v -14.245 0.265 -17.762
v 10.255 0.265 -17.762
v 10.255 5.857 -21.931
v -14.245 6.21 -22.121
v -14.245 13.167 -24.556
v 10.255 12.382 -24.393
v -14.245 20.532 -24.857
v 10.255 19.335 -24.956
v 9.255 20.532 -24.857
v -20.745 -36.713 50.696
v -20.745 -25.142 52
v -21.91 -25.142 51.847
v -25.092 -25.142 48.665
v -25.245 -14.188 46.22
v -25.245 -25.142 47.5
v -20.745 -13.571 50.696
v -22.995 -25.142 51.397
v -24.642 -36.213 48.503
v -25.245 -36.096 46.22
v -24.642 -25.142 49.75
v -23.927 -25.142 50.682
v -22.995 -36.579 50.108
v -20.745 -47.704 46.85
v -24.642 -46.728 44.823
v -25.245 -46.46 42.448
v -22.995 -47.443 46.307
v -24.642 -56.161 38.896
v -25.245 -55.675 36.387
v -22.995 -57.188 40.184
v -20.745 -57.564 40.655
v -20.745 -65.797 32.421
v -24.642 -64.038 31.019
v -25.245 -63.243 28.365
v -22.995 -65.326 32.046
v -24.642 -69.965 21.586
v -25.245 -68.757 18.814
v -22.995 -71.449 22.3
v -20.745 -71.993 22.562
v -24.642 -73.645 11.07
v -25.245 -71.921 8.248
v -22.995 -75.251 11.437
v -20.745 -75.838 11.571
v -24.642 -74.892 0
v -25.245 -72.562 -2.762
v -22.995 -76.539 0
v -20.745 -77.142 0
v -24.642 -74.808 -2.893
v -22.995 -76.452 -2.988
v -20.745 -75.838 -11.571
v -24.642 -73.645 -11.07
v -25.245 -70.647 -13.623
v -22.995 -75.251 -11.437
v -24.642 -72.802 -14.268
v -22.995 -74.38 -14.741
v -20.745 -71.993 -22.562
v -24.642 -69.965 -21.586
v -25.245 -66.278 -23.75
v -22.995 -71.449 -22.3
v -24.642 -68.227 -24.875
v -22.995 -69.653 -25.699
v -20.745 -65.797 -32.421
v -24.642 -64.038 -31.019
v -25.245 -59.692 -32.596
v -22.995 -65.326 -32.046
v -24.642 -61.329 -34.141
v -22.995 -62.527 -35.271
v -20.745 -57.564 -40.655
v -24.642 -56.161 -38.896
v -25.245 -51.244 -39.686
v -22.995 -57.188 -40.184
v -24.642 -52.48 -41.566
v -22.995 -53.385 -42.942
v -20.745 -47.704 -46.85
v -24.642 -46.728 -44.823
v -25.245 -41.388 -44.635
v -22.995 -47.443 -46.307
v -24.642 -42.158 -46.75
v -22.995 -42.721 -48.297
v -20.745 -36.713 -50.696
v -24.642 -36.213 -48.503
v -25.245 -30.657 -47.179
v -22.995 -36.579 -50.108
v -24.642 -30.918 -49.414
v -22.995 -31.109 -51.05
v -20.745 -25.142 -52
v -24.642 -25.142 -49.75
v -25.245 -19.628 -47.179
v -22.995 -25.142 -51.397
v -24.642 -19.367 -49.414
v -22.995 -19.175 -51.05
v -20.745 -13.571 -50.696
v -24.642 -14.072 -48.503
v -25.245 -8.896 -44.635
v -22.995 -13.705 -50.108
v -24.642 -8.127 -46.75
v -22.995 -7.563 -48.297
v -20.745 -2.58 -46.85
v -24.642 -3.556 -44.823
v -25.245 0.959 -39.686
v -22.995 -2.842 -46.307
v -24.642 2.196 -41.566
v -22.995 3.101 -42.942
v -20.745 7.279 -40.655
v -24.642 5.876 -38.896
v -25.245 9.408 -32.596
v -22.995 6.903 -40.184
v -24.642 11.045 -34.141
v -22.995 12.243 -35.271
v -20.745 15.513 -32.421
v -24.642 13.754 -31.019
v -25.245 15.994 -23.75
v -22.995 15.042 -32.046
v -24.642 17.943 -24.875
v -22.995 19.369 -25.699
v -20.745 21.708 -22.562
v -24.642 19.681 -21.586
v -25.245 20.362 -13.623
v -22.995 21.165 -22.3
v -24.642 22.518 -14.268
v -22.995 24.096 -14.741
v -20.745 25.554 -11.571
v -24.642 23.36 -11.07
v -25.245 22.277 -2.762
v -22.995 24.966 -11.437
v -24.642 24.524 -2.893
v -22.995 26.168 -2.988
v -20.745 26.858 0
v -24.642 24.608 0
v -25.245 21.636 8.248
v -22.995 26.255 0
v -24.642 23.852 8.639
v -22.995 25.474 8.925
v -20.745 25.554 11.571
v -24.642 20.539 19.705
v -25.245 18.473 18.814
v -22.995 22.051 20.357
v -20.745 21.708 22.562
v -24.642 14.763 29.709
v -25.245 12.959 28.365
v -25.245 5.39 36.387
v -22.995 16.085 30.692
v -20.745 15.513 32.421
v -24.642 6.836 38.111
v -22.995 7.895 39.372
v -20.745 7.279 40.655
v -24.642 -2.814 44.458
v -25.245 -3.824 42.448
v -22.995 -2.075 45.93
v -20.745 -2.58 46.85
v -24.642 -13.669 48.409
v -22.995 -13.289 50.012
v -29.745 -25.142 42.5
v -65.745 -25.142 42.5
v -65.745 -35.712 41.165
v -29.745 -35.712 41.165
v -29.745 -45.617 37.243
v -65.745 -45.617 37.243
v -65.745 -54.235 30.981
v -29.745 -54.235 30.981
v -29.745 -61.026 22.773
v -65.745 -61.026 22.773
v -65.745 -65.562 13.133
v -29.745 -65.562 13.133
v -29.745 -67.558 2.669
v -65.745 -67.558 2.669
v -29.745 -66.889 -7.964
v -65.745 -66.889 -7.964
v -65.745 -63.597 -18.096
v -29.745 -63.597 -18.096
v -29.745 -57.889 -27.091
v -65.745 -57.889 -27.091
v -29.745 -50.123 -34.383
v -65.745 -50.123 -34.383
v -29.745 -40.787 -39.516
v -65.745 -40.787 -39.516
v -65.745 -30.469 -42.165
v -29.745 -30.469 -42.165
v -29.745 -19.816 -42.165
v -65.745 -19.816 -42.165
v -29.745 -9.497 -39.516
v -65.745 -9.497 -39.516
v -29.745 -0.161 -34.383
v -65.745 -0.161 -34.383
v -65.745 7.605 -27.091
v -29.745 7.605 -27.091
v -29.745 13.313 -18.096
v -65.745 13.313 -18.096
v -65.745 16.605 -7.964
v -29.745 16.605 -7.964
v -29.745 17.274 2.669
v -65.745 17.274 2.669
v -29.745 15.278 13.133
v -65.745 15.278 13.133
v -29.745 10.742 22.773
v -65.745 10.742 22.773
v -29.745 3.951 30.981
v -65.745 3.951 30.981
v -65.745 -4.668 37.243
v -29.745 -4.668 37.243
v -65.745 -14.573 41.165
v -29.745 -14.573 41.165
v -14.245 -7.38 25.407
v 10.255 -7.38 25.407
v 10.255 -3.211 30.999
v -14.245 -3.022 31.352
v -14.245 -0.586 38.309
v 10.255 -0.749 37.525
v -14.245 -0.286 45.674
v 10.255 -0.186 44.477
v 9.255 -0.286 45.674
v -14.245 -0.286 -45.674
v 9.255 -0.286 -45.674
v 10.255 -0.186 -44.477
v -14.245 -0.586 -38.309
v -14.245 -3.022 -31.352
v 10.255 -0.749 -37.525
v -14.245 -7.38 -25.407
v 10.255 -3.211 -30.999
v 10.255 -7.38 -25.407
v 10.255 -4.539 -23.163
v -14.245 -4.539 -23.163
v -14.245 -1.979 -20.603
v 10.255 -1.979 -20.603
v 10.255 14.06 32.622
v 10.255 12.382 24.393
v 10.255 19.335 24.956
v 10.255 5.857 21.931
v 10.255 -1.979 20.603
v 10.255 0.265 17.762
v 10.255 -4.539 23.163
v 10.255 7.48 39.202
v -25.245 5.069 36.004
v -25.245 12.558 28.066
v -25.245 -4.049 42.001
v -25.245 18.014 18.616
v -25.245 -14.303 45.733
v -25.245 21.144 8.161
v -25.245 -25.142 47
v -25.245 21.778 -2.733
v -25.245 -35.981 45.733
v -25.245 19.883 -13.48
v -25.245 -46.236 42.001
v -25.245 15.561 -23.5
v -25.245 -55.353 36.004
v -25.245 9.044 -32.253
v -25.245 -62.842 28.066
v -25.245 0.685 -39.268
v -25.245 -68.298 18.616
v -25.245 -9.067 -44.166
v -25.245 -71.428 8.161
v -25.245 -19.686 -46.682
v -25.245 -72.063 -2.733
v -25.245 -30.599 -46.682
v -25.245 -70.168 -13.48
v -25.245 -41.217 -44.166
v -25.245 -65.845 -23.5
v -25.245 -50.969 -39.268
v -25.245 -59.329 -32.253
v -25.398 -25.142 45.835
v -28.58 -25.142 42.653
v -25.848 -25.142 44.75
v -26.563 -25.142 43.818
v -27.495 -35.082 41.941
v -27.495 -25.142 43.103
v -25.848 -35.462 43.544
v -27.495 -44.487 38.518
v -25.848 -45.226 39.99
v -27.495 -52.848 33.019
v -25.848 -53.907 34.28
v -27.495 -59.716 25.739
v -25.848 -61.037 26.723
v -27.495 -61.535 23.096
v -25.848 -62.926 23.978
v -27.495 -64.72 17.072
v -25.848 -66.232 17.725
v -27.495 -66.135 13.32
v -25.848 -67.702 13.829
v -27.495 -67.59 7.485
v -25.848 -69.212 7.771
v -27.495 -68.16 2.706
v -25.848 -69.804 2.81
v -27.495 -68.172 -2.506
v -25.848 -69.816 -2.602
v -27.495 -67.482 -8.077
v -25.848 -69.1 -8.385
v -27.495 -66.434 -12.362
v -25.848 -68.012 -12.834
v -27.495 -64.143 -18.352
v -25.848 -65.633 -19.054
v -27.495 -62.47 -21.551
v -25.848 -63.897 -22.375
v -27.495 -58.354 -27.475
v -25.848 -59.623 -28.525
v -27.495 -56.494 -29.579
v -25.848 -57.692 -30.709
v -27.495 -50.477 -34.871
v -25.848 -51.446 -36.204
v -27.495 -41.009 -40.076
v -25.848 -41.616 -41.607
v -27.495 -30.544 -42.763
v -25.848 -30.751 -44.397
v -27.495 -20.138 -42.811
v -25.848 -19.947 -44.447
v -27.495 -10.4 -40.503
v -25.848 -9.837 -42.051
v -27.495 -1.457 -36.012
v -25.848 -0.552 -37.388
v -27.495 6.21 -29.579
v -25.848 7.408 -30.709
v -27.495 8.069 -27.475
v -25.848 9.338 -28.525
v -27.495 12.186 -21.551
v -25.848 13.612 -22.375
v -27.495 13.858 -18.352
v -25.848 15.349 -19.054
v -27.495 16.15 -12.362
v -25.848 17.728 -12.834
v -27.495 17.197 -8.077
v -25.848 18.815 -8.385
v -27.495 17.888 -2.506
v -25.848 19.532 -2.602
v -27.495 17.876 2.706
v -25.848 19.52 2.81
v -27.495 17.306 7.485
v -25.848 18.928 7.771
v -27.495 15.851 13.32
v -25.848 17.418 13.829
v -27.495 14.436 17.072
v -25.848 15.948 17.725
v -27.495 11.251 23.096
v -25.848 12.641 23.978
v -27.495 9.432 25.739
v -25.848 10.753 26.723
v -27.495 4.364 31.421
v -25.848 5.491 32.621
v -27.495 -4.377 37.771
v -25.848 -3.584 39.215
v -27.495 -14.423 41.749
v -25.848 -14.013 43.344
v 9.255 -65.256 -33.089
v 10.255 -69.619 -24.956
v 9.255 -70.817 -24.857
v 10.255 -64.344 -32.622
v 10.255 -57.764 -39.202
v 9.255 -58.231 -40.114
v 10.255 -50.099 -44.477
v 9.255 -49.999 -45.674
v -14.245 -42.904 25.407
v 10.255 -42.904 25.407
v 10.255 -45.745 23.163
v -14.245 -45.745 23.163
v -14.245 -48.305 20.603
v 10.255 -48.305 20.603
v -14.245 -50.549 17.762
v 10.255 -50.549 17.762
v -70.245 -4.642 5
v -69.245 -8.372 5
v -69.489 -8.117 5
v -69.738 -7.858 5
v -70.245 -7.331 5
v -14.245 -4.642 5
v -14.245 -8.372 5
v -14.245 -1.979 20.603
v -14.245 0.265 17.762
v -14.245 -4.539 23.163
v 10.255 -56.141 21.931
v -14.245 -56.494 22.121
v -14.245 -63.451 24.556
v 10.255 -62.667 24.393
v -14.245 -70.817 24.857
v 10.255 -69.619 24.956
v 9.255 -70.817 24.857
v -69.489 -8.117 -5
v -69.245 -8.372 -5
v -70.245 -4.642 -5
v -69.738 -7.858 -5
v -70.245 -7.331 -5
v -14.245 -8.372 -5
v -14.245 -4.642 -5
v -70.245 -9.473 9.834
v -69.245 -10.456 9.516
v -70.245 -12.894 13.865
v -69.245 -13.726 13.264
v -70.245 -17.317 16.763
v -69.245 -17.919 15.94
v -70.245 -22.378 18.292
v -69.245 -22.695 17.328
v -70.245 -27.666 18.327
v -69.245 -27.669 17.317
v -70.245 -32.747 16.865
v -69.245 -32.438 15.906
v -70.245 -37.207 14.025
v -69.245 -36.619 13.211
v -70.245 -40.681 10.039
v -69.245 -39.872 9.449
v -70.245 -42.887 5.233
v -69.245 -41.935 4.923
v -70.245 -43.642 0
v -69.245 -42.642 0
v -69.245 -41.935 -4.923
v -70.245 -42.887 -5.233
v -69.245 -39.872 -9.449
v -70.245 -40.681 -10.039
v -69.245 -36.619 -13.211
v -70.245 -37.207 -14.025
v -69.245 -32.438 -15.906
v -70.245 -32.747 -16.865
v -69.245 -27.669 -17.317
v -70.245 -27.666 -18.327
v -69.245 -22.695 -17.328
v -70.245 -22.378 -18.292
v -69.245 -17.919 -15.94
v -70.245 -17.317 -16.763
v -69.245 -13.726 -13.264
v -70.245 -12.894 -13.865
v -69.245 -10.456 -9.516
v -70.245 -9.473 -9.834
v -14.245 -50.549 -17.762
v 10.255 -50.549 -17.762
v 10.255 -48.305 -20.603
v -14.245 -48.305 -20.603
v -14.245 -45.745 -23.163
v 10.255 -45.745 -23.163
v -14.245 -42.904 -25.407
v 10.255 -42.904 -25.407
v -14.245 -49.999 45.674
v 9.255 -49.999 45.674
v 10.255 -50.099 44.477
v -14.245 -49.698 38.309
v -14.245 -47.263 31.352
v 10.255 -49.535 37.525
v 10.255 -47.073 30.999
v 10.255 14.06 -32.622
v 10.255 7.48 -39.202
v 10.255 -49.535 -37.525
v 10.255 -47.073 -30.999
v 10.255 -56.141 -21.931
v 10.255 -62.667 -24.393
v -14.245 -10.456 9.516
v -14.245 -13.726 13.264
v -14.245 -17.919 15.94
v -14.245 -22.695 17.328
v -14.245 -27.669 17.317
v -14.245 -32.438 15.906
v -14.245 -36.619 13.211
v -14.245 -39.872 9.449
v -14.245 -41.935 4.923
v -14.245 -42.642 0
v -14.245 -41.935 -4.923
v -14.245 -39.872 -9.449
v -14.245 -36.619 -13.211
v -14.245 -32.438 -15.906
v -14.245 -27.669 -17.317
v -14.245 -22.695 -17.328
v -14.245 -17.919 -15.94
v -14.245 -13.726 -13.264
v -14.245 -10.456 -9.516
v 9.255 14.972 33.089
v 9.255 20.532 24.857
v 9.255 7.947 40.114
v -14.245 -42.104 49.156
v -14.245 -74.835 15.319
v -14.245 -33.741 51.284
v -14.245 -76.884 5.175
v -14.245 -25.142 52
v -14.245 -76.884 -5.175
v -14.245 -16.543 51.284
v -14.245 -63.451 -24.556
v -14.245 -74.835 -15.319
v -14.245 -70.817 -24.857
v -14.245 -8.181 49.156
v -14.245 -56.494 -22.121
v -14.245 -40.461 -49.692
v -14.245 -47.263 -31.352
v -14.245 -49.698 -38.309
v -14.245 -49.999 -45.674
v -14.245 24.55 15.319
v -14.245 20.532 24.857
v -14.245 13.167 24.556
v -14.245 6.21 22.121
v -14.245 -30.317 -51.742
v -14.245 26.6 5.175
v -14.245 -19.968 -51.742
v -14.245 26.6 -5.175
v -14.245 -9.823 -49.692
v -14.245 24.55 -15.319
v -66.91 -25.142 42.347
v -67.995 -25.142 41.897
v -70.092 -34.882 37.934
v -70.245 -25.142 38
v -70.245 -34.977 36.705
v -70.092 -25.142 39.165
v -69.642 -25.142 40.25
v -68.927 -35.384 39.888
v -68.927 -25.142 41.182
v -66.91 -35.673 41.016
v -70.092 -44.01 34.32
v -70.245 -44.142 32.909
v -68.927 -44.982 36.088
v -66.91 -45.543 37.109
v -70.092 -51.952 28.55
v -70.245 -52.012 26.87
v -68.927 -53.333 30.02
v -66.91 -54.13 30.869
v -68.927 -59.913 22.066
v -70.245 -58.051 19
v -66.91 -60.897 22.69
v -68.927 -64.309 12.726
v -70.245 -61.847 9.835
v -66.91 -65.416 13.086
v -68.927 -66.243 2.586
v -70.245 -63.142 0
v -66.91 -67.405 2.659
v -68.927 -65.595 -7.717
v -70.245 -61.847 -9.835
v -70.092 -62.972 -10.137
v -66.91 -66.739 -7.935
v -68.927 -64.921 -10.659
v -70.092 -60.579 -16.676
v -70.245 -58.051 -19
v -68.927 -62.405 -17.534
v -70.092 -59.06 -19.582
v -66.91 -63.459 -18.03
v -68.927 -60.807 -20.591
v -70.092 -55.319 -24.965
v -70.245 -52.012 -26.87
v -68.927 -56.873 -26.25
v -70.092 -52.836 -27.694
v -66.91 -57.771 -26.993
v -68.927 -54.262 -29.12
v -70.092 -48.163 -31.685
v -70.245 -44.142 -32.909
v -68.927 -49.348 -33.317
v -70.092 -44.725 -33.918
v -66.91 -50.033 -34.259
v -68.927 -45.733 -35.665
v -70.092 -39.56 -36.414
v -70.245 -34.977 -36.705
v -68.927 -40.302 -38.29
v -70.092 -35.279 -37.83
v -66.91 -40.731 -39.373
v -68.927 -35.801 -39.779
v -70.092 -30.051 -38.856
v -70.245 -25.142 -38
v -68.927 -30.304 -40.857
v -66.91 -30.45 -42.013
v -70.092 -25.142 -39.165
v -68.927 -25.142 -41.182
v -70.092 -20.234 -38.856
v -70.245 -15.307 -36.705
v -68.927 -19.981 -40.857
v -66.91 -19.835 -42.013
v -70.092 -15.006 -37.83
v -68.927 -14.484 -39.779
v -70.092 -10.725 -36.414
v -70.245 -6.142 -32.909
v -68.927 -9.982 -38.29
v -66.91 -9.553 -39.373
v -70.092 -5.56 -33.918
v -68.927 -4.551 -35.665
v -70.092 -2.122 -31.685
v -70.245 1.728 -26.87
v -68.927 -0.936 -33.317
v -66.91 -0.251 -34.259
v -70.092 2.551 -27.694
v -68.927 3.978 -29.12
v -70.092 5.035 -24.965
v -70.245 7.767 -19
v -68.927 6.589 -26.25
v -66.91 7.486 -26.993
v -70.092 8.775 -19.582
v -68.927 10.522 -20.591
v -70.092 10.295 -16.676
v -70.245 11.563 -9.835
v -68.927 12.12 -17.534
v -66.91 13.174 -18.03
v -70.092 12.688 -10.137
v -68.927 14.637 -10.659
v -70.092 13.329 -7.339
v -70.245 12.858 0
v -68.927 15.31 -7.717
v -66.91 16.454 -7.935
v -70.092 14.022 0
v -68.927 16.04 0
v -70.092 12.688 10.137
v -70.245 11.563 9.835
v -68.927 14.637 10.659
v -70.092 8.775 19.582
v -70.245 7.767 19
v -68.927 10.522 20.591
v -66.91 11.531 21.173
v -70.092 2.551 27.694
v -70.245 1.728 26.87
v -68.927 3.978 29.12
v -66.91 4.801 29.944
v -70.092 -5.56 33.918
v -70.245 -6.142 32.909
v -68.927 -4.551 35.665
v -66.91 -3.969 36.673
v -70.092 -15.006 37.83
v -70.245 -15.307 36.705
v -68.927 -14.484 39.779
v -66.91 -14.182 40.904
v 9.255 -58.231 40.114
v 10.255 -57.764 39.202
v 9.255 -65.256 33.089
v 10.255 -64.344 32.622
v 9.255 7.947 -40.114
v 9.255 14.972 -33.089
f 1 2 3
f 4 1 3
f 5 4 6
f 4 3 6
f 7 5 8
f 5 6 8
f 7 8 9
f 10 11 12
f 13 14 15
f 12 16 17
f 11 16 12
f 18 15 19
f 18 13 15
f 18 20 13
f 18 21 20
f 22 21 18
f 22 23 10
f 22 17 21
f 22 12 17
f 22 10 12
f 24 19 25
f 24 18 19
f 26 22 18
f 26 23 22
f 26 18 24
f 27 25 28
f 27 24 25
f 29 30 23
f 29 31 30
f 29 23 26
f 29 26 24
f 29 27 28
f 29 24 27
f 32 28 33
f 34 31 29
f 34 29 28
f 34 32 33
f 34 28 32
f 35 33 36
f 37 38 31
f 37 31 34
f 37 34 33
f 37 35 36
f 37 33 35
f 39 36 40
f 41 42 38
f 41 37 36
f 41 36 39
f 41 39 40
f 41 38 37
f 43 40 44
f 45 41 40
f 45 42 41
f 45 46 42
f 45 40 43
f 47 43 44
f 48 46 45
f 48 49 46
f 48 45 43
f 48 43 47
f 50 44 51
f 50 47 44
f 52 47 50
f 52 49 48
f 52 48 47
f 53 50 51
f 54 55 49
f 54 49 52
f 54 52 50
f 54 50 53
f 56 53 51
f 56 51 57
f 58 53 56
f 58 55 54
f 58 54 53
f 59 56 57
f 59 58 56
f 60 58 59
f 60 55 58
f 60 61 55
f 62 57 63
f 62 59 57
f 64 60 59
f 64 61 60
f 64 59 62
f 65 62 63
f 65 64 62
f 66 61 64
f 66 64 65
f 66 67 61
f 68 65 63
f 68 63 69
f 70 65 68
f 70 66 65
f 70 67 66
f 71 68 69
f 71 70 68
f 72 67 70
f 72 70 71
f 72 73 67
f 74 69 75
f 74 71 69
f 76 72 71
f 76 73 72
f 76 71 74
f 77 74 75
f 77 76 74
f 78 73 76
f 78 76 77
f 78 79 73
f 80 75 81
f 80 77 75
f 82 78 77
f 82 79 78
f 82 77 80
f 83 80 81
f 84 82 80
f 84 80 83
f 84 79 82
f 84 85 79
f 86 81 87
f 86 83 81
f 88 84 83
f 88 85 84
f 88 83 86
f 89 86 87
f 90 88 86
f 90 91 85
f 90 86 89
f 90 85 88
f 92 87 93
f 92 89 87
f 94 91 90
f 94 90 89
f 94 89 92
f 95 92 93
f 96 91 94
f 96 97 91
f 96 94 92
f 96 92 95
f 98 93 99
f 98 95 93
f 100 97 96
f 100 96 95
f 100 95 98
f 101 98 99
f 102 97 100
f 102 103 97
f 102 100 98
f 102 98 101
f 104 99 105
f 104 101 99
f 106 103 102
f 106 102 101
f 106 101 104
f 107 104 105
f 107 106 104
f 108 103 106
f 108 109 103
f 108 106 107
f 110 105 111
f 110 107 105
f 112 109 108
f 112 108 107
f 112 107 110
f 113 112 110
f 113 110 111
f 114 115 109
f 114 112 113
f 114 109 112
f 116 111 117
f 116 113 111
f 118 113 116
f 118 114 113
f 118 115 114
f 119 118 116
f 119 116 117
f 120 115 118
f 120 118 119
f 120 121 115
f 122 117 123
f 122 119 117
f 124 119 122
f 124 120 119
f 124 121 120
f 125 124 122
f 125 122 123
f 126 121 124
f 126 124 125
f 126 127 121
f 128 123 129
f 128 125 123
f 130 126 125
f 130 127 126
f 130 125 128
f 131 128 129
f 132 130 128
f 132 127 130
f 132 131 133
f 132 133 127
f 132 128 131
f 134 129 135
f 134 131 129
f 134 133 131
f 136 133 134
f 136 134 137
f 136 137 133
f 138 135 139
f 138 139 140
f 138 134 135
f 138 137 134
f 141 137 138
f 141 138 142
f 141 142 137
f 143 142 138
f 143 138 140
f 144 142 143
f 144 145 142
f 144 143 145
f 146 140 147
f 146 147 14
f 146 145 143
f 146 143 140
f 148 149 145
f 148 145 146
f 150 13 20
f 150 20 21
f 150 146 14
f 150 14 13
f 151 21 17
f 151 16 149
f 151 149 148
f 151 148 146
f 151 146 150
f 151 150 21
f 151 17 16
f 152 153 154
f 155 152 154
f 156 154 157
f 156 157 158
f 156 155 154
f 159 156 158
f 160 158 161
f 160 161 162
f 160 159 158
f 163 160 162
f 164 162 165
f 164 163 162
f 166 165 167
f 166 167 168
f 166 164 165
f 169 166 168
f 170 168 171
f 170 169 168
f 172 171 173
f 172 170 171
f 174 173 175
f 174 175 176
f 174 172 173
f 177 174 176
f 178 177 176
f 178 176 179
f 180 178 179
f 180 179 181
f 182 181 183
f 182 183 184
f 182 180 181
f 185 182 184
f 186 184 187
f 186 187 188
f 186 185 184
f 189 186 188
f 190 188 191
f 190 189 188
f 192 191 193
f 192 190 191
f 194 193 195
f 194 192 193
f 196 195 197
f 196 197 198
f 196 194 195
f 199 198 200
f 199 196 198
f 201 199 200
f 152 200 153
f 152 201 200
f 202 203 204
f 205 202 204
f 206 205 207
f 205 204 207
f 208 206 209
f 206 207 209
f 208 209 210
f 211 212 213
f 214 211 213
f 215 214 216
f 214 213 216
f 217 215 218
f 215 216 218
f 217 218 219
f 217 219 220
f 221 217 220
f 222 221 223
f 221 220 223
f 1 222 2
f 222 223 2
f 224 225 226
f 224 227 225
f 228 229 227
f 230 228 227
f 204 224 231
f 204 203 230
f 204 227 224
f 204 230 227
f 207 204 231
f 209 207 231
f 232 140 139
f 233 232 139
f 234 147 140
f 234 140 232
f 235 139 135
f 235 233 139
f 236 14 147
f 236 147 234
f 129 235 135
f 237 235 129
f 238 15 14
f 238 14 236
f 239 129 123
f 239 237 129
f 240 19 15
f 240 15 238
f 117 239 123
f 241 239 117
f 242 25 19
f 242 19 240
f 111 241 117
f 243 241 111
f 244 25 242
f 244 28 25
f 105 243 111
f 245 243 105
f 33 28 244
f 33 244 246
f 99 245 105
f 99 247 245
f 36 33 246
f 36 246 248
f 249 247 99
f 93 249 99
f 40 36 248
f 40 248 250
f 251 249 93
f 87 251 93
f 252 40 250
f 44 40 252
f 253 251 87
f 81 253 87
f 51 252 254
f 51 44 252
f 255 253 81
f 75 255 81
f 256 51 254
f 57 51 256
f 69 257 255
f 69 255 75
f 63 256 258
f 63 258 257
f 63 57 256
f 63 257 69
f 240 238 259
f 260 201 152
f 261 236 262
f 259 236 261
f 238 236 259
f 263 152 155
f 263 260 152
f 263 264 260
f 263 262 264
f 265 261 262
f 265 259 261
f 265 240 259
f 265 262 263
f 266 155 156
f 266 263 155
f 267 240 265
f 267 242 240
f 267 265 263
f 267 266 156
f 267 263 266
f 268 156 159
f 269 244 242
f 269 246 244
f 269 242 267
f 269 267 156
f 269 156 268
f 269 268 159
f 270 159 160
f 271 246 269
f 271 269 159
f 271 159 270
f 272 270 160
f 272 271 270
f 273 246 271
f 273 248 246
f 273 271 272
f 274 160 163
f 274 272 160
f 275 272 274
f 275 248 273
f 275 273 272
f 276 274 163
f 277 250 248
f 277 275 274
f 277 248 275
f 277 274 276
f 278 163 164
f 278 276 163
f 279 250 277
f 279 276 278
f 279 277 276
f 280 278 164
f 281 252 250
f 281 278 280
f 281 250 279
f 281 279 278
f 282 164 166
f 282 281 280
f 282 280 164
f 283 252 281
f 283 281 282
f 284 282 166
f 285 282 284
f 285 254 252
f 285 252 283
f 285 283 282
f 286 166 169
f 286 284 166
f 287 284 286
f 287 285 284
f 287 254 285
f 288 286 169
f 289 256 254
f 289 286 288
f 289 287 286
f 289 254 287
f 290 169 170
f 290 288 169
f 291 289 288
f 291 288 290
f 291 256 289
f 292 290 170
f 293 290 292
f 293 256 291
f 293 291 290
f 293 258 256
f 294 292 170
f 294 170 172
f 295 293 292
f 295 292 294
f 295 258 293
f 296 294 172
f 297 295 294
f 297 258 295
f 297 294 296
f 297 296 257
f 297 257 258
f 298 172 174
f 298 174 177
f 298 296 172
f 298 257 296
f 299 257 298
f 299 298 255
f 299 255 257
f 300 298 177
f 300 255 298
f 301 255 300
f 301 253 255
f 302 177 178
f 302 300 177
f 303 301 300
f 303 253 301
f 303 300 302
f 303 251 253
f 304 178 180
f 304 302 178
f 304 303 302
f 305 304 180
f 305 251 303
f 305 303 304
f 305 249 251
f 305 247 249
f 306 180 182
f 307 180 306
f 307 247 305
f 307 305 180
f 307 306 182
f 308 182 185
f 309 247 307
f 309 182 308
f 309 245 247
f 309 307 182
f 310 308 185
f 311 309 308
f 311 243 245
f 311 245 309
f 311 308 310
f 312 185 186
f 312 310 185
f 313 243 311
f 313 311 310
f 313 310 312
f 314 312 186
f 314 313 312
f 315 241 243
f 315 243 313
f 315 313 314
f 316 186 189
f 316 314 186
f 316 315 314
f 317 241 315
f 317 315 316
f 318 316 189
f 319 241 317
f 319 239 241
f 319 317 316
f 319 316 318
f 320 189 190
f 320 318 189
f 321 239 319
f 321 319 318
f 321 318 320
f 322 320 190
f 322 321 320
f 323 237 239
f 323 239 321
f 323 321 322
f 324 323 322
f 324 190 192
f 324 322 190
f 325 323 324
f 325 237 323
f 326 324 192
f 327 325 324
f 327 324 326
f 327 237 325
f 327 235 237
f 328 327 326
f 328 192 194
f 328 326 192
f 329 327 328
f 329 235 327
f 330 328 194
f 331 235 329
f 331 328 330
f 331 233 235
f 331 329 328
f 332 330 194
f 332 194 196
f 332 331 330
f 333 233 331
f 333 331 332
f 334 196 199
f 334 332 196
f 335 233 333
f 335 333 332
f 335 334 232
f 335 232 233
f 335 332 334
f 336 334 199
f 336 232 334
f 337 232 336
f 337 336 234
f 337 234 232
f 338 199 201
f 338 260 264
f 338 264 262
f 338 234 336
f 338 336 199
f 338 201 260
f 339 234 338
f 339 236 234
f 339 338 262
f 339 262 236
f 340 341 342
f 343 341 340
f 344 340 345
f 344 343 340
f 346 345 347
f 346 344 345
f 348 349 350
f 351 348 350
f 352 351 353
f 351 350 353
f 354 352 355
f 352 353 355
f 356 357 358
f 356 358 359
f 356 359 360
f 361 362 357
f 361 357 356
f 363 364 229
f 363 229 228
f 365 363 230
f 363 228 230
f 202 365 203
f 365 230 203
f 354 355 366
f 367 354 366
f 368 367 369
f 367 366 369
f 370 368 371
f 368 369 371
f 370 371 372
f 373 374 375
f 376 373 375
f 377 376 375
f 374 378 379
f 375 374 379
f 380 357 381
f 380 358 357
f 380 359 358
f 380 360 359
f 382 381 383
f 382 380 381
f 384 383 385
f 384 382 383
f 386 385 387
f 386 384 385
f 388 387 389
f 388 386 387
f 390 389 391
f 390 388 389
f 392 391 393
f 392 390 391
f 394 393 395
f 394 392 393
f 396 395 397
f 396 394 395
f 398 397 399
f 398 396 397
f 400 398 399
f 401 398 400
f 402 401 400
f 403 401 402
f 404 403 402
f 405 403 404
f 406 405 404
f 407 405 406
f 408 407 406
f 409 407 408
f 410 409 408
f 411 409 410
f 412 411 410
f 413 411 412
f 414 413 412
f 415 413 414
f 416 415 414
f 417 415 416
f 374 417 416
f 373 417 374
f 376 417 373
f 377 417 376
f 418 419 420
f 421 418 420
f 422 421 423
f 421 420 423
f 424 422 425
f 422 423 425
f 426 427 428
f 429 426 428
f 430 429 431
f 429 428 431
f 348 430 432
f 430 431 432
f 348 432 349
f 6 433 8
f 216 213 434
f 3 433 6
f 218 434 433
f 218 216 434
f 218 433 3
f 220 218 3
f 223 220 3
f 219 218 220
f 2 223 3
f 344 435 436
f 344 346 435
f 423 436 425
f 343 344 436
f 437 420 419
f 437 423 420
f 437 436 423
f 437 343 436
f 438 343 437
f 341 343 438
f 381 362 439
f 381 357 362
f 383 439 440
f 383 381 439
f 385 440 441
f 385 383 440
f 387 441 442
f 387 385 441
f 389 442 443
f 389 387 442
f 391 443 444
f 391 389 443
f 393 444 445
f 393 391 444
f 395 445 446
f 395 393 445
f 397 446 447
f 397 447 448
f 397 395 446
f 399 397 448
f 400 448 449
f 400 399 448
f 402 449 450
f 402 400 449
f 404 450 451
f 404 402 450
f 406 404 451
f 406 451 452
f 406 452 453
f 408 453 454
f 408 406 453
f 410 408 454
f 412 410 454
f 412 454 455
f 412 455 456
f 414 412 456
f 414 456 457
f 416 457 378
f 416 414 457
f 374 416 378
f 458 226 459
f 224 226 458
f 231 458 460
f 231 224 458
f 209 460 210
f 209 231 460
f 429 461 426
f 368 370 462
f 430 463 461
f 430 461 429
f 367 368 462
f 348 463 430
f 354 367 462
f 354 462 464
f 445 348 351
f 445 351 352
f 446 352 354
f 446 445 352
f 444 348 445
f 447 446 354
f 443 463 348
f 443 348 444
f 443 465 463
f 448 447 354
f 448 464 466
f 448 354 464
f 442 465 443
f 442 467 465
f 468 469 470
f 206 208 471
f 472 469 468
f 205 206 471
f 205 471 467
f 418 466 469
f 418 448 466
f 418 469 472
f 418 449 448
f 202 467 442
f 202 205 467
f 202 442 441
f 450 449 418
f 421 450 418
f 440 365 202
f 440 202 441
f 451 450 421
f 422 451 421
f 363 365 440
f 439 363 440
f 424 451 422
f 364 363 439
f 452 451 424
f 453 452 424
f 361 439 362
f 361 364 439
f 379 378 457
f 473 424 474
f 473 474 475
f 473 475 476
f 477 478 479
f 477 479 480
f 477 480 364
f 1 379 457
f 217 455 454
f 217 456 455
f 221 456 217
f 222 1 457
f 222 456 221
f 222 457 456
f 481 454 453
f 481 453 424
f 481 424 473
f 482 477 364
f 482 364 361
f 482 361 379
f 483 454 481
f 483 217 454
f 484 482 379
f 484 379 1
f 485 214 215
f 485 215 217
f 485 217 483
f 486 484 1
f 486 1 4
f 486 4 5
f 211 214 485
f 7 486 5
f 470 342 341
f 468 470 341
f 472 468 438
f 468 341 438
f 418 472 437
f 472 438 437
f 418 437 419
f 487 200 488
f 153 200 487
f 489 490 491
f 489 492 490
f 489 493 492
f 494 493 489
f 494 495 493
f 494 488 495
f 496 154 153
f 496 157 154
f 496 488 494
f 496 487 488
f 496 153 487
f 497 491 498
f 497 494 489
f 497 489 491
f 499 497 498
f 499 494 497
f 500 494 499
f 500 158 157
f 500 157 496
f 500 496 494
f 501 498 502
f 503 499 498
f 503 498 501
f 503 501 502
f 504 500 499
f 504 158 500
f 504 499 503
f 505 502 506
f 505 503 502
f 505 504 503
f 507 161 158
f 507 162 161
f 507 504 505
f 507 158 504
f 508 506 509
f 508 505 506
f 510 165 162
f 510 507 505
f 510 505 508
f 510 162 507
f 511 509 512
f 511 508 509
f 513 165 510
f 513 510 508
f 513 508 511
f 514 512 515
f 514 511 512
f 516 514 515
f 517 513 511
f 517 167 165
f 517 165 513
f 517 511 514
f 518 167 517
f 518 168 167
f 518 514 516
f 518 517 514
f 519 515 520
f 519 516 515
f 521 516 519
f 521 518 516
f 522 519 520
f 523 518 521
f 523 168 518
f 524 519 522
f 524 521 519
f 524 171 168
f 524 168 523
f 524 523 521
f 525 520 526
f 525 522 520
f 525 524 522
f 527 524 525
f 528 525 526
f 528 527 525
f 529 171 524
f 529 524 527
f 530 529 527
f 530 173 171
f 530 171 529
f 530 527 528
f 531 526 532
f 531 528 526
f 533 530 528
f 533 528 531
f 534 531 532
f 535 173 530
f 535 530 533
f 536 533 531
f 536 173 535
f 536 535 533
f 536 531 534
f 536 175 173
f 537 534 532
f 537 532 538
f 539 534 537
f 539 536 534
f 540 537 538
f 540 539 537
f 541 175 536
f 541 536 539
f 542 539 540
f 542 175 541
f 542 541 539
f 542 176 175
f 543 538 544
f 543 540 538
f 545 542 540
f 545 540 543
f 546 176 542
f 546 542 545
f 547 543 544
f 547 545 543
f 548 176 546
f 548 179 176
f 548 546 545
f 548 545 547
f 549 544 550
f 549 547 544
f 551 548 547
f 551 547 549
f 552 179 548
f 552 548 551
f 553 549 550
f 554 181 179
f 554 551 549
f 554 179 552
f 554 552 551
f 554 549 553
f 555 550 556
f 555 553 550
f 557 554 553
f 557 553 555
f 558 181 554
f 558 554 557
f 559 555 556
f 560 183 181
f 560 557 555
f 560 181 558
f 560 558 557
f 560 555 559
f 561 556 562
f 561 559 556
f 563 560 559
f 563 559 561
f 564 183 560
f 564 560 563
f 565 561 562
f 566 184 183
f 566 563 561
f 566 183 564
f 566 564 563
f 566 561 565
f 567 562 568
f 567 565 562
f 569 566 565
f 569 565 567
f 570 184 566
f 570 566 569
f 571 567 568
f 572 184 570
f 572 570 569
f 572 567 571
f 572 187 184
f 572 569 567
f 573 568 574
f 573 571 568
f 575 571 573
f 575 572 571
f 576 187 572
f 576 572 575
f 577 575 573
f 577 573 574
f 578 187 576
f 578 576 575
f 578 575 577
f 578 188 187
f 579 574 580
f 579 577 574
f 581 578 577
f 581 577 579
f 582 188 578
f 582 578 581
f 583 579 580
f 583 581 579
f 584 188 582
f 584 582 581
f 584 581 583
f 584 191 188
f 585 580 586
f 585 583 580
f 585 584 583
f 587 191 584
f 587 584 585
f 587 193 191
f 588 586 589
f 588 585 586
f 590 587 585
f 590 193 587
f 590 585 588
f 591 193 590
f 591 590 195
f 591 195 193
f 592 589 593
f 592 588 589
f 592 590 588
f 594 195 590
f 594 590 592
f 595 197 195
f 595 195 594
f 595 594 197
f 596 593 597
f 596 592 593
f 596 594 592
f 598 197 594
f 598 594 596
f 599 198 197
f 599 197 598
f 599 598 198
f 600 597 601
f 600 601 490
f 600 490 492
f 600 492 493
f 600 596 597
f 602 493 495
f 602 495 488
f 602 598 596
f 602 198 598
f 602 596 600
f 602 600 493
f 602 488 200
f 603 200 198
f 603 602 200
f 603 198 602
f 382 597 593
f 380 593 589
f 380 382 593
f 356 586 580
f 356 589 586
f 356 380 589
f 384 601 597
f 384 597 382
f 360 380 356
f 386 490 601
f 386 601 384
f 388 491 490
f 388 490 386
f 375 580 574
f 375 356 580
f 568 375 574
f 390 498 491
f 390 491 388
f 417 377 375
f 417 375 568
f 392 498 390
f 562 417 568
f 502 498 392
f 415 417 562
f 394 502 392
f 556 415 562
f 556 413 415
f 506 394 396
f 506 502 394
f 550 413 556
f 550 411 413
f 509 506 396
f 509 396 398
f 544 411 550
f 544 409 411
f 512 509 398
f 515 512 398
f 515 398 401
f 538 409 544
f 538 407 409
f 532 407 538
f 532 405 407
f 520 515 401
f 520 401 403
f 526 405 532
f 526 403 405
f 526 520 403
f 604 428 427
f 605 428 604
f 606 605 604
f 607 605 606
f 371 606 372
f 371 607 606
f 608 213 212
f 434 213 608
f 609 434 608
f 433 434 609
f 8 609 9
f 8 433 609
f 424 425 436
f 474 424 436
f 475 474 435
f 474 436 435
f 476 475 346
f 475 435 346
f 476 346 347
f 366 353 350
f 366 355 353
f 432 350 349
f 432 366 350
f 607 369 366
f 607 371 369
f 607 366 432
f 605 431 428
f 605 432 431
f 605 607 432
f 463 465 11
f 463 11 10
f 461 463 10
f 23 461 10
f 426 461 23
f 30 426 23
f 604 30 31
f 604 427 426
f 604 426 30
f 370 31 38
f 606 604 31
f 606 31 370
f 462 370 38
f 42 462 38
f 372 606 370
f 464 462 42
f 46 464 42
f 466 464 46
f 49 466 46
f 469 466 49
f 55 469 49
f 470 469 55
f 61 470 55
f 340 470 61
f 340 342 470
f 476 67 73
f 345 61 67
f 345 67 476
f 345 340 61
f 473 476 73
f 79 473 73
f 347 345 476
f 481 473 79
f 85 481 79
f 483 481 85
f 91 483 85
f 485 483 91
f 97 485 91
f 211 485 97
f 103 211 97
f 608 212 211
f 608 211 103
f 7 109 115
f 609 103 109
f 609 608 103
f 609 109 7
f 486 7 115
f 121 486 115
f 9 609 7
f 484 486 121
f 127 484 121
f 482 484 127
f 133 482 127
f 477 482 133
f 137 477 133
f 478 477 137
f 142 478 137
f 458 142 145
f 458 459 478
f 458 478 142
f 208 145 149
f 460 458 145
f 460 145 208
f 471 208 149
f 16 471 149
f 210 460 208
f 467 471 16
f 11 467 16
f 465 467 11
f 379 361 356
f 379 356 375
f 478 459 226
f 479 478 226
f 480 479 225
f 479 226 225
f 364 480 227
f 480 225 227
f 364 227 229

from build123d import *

# Parameters (mm, degrees)
CUT_EXTRUDE_1_DEPTH = 24.5
SKETCH_4_W          = 10
SKETCH_4_H          = 7.054294233
CUT_EXTRUDE_2_DEPTH = 109.585993287


with BuildPart() as part:
    # Эскиз1 → Повернуть1 (revolve)
    with BuildSketch(Plane.XY, mode=Mode.PRIVATE) as revolve_1_sk:
        with BuildLine():
            Line((-70.245087719, -6.642192982), (-70.245087719, 12.857807018))
            ThreePointArc((-70.245087719, 12.857807018), (-68.927068235, 16.039787533), (-65.745087719, 17.357807018))
            Line((-65.745087719, 17.357807018), (-29.745087719, 17.357807018))
            ThreePointArc((-29.745087719, 17.357807018), (-26.563107204, 18.675826502), (-25.245087719, 21.857807018))
            Line((-25.245087719, 21.857807018), (-25.245087719, 22.357807018))
            ThreePointArc((-25.245087719, 22.357807018), (-23.927068235, 25.539787533), (-20.745087719, 26.857807018))
            Line((-20.745087719, 26.857807018), (9.254912281, 26.857807018))
            Line((9.254912281, 26.857807018), (10.254912281, 25.857807018))
            Line((10.254912281, 25.857807018), (10.254912281, -6.642192982))
            Line((10.254912281, -6.642192982), (9.254912281, -7.642192982))
            Line((9.254912281, -7.642192982), (-69.245087719, -7.642192982))
            Line((-69.245087719, -7.642192982), (-70.245087719, -6.642192982))
        make_face()
    revolve(revolve_1_sk.sketch.rotate(Axis((-70.245087719, -25.142192982, 0), (1, 0, 0)), 90), axis=Axis((-70.245087719, -25.142192982, 0), (1, 0, 0)))

    # Эскиз3 → Вырез-Вытянуть1 (cut)
    with BuildSketch(Plane(origin=(10.254912281, 0, 0), x_dir=(0, 0, -1), z_dir=(1, 0, 0))):
        with BuildLine():
            ThreePointArc((-17.761912417, -50.549169727), (0, -93.142192982), (17.761912417, -50.549169727))
            ThreePointArc((17.761912417, -50.549169727), (21.920310217, -47.062503199), (25.406976744, -42.9041054))
            ThreePointArc((25.406976744, -42.9041054), (68, -25.142192982), (25.406976744, -7.380280565))
            ThreePointArc((25.406976744, -7.380280565), (21.920310217, -3.221882766), (17.761912417, 0.264783762))
            ThreePointArc((17.761912417, 0.264783762), (0, 42.857807018), (-17.761912417, 0.264783762))
            ThreePointArc((-17.761912417, 0.264783762), (-21.920310217, -3.221882766), (-25.406976744, -7.380280565))
            ThreePointArc((-25.406976744, -7.380280565), (-68, -25.142192982), (-25.406976744, -42.9041054))
            ThreePointArc((-25.406976744, -42.9041054), (-21.920310217, -47.062503199), (-17.761912417, -50.549169727))
        make_face()
    extrude(amount=-CUT_EXTRUDE_1_DEPTH, mode=Mode.SUBTRACT)

    # Эскиз4 → Вырез-Вытянуть2 (cut, through all)
    with BuildSketch(Plane(origin=(-14.245087719, 0, 0), x_dir=(0, 0, -1), z_dir=(1, 0, 0))):
        with Locations((0, -8.169340099)):
            Rectangle(SKETCH_4_W, SKETCH_4_H)
    extrude(amount=-CUT_EXTRUDE_2_DEPTH, mode=Mode.SUBTRACT)


solid = part.part
